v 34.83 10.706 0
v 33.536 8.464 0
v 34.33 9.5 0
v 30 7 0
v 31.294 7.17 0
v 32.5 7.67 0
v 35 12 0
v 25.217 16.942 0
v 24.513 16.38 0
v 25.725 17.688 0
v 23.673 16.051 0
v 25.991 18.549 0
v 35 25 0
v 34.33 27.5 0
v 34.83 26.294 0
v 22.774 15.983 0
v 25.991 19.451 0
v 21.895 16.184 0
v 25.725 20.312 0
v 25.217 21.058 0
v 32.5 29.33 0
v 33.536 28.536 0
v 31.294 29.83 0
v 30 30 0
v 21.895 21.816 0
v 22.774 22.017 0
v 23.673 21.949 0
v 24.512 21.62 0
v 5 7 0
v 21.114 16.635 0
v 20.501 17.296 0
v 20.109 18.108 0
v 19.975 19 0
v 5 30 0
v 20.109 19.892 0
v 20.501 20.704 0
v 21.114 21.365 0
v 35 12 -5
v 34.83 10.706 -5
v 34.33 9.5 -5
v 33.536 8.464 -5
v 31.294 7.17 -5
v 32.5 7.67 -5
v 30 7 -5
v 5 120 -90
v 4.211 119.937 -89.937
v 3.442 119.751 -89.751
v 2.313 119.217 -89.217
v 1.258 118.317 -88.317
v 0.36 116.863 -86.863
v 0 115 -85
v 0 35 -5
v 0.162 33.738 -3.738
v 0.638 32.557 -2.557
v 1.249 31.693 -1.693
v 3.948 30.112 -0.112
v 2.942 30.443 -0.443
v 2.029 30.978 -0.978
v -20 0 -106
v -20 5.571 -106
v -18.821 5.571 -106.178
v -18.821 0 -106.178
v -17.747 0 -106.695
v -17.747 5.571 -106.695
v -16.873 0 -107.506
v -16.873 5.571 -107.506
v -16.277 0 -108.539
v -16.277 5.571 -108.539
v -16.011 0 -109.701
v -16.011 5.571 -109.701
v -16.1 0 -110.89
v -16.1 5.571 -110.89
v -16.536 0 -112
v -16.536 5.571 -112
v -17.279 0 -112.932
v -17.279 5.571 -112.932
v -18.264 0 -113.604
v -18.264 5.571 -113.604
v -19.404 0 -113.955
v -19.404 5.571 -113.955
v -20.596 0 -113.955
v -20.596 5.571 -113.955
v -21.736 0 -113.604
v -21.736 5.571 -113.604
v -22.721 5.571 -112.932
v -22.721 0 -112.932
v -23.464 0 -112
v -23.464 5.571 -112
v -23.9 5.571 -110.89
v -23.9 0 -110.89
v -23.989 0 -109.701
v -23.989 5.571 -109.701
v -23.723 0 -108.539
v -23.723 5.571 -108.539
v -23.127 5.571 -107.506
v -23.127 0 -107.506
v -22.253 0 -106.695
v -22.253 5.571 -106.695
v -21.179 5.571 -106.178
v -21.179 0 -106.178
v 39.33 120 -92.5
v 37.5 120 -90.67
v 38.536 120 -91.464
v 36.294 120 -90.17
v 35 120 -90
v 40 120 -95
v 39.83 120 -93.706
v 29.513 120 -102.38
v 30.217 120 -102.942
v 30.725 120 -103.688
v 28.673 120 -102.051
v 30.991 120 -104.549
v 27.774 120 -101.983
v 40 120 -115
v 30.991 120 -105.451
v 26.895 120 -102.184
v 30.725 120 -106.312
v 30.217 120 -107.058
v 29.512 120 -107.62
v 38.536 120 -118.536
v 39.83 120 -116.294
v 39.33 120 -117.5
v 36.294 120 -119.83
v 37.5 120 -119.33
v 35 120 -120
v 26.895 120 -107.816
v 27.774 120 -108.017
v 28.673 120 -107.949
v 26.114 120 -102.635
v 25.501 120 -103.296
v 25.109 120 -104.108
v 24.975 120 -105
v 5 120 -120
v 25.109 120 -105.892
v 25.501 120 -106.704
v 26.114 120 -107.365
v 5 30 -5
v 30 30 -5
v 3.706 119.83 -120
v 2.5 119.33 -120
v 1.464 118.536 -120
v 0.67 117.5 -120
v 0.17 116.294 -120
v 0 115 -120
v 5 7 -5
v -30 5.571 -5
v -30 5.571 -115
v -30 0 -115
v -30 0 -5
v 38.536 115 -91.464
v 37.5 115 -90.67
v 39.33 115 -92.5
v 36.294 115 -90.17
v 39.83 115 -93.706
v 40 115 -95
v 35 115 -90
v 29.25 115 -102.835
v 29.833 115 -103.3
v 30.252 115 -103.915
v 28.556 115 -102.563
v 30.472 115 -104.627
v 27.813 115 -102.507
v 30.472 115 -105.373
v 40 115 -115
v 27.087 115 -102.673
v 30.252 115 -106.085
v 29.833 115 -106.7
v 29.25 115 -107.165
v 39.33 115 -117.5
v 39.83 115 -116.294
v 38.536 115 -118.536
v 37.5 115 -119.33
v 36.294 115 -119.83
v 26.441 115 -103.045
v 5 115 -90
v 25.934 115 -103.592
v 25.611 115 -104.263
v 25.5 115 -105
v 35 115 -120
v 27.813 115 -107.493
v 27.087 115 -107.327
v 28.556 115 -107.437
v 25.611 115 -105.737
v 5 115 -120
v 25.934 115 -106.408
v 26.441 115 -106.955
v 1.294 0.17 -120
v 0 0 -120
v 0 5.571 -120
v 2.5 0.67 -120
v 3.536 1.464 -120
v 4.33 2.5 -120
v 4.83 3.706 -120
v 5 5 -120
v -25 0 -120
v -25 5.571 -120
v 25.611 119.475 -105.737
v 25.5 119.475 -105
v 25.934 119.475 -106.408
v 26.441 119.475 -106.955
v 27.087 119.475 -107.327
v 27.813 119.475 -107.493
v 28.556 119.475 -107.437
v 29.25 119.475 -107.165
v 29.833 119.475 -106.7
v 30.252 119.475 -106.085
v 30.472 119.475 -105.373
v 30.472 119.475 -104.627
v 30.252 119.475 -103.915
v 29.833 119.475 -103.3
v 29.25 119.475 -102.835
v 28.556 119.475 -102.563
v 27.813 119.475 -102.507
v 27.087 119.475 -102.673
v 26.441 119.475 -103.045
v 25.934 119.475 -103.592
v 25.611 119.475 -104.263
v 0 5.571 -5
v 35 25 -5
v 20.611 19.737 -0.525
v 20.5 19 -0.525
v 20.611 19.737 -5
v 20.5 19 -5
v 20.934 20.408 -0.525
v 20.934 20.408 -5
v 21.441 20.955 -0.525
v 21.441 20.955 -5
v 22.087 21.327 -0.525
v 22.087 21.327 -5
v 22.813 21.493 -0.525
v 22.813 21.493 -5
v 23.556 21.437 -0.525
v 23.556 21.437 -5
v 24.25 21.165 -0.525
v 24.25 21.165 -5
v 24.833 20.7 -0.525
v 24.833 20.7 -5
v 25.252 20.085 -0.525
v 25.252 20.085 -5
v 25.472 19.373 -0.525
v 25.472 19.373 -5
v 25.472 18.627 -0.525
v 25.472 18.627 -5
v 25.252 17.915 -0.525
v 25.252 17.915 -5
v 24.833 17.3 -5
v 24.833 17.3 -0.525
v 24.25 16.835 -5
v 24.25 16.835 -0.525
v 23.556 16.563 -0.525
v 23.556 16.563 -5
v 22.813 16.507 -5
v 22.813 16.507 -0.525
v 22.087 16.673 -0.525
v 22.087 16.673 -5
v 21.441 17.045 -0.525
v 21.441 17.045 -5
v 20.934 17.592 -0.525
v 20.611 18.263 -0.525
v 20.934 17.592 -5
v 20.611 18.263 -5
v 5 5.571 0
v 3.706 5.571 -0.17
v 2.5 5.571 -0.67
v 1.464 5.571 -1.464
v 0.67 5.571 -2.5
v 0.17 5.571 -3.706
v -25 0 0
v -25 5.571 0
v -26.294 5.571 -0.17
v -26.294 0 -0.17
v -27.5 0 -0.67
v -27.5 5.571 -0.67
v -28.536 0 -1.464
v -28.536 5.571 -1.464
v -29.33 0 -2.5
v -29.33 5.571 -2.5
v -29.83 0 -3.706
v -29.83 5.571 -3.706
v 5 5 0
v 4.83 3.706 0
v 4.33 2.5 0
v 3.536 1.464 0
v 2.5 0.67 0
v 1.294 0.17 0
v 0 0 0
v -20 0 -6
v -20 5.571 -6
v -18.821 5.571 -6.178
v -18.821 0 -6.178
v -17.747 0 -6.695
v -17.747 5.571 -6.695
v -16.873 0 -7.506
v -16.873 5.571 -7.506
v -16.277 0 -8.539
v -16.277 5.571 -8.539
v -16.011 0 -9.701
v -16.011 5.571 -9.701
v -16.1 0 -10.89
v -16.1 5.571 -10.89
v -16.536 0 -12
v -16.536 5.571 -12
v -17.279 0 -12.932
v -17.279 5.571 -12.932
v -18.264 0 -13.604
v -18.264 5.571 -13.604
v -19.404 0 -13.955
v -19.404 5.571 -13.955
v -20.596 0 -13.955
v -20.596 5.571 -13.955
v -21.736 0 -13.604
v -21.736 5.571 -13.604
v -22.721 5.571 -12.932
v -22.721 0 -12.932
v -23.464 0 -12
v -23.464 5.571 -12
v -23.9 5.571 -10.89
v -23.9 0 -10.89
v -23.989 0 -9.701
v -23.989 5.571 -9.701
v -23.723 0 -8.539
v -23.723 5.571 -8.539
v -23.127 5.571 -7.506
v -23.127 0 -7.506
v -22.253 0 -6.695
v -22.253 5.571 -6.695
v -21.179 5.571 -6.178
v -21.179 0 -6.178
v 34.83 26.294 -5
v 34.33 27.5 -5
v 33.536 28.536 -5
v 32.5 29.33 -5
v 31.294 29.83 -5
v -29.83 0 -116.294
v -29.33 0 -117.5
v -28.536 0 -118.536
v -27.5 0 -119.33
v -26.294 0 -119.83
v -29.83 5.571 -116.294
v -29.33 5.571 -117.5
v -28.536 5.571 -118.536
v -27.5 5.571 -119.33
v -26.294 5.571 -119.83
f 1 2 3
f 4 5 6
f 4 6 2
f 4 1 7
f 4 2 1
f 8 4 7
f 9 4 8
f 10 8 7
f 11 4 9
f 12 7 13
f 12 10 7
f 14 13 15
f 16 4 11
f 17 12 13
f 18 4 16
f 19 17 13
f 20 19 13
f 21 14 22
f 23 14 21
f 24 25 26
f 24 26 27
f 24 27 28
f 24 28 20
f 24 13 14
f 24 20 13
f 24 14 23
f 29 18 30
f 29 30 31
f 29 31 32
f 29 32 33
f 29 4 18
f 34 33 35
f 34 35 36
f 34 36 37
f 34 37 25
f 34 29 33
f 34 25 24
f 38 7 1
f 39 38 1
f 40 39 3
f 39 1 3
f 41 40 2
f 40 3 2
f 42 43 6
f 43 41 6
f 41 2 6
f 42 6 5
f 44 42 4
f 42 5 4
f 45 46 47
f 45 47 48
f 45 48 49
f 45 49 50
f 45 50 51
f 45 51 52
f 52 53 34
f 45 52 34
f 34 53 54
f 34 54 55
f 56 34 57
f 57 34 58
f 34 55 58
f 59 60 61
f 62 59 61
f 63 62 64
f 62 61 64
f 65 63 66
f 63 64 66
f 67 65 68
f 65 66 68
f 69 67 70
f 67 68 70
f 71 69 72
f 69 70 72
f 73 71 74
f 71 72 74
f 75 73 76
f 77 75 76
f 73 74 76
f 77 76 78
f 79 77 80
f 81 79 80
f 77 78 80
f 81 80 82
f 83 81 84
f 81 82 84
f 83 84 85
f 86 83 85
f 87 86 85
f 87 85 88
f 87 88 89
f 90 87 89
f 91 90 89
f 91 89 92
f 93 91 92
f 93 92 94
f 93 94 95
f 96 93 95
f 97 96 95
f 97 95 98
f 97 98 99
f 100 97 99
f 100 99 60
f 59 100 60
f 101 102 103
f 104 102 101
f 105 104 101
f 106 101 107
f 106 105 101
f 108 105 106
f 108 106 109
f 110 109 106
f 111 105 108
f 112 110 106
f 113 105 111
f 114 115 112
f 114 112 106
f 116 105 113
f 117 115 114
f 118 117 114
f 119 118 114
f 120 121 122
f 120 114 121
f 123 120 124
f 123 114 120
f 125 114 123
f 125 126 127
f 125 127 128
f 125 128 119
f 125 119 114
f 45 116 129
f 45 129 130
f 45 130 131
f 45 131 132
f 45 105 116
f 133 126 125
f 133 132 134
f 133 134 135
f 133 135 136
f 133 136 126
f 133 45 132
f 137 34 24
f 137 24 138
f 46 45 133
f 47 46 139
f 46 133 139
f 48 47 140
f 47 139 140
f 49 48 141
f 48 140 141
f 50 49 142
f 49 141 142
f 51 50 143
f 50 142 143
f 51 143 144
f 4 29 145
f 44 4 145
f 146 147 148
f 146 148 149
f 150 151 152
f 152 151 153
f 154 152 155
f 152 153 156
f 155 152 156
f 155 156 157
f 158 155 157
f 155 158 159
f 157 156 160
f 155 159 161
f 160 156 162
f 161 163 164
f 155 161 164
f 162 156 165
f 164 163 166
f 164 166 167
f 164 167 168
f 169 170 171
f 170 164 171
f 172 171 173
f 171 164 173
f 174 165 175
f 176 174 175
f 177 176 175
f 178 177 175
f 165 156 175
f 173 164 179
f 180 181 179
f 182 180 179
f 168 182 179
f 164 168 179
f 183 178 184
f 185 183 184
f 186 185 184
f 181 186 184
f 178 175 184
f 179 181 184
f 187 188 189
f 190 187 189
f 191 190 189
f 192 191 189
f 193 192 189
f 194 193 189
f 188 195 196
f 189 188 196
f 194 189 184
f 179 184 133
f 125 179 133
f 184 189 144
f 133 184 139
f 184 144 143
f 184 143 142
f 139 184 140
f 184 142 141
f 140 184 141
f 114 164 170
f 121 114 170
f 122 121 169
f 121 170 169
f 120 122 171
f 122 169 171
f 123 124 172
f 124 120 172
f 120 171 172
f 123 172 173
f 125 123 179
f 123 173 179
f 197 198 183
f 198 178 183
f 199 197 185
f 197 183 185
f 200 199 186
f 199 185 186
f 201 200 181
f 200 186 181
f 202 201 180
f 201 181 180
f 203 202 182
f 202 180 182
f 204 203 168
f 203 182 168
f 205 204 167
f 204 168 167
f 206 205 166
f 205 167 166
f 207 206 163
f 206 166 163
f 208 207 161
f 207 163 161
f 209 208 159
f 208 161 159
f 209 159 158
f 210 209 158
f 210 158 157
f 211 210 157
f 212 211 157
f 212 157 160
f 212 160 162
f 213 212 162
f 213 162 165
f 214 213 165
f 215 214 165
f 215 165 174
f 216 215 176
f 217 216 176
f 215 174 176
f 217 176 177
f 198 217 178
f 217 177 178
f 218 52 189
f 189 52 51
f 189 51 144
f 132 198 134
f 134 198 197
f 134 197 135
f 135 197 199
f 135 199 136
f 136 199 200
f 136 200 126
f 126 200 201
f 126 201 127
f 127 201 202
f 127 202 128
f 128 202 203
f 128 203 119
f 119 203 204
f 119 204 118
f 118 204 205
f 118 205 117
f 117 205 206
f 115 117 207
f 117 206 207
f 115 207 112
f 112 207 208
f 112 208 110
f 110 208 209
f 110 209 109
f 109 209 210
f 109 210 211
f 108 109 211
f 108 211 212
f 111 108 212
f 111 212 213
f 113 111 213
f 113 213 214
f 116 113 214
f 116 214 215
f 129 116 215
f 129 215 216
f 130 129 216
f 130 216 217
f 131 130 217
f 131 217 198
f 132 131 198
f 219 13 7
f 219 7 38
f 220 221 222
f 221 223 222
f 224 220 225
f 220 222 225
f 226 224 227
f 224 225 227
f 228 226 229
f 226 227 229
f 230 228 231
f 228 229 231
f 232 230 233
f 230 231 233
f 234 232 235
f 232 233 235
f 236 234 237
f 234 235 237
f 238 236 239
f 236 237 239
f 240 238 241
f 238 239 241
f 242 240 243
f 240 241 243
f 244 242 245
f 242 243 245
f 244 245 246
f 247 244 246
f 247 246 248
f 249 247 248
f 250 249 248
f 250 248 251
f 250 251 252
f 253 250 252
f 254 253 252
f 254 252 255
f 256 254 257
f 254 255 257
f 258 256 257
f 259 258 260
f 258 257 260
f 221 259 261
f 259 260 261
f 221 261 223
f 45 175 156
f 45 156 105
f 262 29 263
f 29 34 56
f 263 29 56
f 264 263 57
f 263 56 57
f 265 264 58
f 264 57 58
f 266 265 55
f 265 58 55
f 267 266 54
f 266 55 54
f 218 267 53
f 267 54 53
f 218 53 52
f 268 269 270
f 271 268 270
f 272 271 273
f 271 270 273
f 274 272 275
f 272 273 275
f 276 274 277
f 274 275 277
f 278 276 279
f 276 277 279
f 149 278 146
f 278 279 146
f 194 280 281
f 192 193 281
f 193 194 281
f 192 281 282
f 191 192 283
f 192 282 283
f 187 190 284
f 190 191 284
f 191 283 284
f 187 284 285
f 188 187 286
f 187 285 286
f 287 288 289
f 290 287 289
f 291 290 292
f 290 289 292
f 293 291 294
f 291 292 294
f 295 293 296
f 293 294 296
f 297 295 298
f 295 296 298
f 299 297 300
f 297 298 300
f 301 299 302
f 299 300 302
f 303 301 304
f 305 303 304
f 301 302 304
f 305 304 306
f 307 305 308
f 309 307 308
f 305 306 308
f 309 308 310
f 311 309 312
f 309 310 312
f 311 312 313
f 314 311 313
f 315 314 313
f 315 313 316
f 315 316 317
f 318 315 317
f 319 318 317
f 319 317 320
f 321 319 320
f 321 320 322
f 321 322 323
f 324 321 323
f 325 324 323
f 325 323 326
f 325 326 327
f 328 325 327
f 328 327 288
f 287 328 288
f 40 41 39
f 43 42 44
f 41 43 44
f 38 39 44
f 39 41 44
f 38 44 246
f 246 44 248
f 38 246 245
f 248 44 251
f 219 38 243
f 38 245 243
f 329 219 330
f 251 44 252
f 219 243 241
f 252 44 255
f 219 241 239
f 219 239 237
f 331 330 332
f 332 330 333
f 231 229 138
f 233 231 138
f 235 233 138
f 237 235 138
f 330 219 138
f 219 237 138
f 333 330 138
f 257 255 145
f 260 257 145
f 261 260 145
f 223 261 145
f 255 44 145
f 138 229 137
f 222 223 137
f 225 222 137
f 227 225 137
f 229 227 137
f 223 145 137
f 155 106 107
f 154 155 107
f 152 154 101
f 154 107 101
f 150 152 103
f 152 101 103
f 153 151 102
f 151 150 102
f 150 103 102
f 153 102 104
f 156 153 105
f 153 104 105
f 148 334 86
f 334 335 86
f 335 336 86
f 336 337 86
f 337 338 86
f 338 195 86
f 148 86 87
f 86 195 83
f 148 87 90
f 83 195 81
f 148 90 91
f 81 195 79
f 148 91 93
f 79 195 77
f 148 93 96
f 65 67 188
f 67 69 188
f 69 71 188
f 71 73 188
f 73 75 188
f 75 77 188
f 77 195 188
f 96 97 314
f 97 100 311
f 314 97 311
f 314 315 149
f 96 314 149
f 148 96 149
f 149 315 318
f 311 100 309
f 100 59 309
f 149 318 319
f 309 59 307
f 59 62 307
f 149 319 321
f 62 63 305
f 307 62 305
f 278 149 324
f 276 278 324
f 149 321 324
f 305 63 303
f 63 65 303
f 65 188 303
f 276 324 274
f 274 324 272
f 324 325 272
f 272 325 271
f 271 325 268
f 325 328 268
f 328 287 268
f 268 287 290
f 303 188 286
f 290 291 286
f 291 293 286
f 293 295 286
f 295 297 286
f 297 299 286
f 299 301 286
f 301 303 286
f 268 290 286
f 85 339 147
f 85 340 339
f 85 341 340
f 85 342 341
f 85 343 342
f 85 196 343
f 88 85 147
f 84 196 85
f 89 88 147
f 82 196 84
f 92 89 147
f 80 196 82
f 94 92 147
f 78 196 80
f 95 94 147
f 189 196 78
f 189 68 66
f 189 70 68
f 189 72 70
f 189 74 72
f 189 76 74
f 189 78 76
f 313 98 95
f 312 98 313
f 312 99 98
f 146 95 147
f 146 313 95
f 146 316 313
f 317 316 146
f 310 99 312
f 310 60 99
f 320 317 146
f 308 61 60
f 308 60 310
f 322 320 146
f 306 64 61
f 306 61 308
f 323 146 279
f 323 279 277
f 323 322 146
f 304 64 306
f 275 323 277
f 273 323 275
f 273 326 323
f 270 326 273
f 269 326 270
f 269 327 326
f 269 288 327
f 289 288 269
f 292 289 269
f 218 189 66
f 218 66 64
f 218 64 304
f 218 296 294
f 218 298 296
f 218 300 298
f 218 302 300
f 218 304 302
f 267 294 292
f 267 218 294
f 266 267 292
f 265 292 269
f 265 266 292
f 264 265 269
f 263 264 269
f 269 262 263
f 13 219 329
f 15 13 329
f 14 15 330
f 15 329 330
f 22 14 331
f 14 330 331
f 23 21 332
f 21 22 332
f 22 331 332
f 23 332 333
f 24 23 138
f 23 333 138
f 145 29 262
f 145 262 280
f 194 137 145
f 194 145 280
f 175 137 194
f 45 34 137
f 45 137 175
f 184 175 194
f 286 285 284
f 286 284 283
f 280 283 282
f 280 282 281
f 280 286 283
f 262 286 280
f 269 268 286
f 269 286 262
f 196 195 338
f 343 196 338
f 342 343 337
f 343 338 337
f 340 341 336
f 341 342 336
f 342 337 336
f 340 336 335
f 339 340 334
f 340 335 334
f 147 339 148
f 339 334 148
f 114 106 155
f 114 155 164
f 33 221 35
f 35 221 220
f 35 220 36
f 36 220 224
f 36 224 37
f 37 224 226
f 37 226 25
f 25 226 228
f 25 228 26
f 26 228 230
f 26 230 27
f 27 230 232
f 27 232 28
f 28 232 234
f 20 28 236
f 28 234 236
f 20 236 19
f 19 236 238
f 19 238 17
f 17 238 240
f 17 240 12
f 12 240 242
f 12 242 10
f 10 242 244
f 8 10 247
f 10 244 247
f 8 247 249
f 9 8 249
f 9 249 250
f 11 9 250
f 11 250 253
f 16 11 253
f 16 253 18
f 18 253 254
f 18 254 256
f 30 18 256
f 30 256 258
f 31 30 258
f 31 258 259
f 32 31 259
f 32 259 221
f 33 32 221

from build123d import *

# Parameters (mm, degrees)
ESTRUSIONE_ESTRUSIONE1_DEPTH    = 5
SCHIZZO2_W                      = 120
SCHIZZO2_H                      = 5.571316046
ESTRUSIONE_ESTRUSIONE2_DEPTH    = 30
SCHIZZO3_W                      = 5
SCHIZZO3_H                      = 23
ESTRUSIONE_ESTRUSIONE3_DEPTH    = 30
SCHIZZO4_W                      = 30
SCHIZZO4_H                      = 5
ESTRUSIONE_ESTRUSIONE4_DEPTH    = 35
RACCORDO1_R                     = 5
FORO_FILETTATO_M6_2_D           = 5
FORO_FILETTATO_M6_2_CSINK_D     = 6.05
FORO_FILETTATO_M6_2_CSINK_ANGLE = 90
FORO_FILETTATO_M6_3_D           = 5
FORO_FILETTATO_M6_3_CSINK_D     = 6.05
FORO_FILETTATO_M6_3_CSINK_ANGLE = 90
SCHIZZO13_R                     = 4
TAGLIO_ESTRUSIONE1_DEPTH        = 171.569410245


with BuildPart() as part:
    # Schizzo1 → Estrusione-Estrusione1 (new body)
    with BuildSketch(Plane(origin=(0, 0, 0), x_dir=(0, 0, -1), z_dir=(1, 0, 0))):
        Polygon((0, 0), (120, 0), (120, 120), (90, 120), (0, 30), align=None)
    extrude(amount=ESTRUSIONE_ESTRUSIONE1_DEPTH)

    # Schizzo2 → Estrusione-Estrusione2 (add)
    with BuildSketch(Plane.ZY):
        with Locations((-60, 2.785658023)):
            Rectangle(SCHIZZO2_W, SCHIZZO2_H)
    extrude(amount=ESTRUSIONE_ESTRUSIONE2_DEPTH)

    # Schizzo3 → Estrusione-Estrusione3 (add)
    with BuildSketch(Plane(origin=(5, 0, 0), x_dir=(0, 0, -1), z_dir=(1, 0, 0))):
        with Locations((2.5, 18.5)):
            Rectangle(SCHIZZO3_W, SCHIZZO3_H)
    extrude(amount=ESTRUSIONE_ESTRUSIONE3_DEPTH)

    # Schizzo4 → Estrusione-Estrusione4 (add)
    with BuildSketch(Plane(origin=(5, 0, 0), x_dir=(0, 0, -1), z_dir=(1, 0, 0))):
        with Locations((105, 117.5)):
            Rectangle(SCHIZZO4_W, SCHIZZO4_H)
    extrude(amount=ESTRUSIONE_ESTRUSIONE4_DEPTH)

    # Raccordo1
    # the kernel refuses this fillet: 5 mm, written as the material it takes off along each edge
    with BuildSketch(Plane(origin=(40, 102.5, -120), x_dir=(0, 0, 1), z_dir=(0, 1, 0)), Plane(origin=(35, 7, 12.5), x_dir=(0, 1, 0), z_dir=(0, 0, -1))) as raccordo1_piece_1:
        with BuildLine():
            CenterArc((RACCORDO1_R, -RACCORDO1_R), RACCORDO1_R, 90, 90)
            Line((0, -RACCORDO1_R), (0, 0))
            Line((0, 0), (RACCORDO1_R, 0))
        make_face()
    extrude(amount=30, mode=Mode.SUBTRACT)
    with BuildSketch(Plane(origin=(40, 132.5, -90), x_dir=(-1, 0, 0), z_dir=(0, -1, 0)), Plane(origin=(35, 30, -17.5), x_dir=(-1, 0, 0), z_dir=(0, 0, 1))) as raccordo1_piece_2:
        with BuildLine():
            CenterArc((RACCORDO1_R, RACCORDO1_R), RACCORDO1_R, 180, 90)
            Line((0, RACCORDO1_R), (0, 0))
            Line((0, 0), (RACCORDO1_R, 0))
        make_face()
    extrude(amount=30, mode=Mode.SUBTRACT)
    with BuildSketch(Plane(origin=(-30, 18.071316046, 0), x_dir=(0, 0, -1), z_dir=(0, -1, 0)), Plane(origin=(-30, -12.5, -120), x_dir=(0, 0, 1), z_dir=(0, 1, 0))) as raccordo1_piece_3:
        with BuildLine():
            CenterArc((RACCORDO1_R, RACCORDO1_R), RACCORDO1_R, 180, 90)
            Line((0, RACCORDO1_R), (0, 0))
            Line((0, 0), (RACCORDO1_R, 0))
        make_face()
    extrude(amount=30.571316046, mode=Mode.SUBTRACT)
    with BuildSketch(Plane(origin=(5, 0, 12.5), x_dir=(-1, 0, 0), z_dir=(0, 0, -1))) as raccordo1_piece_4:
        with BuildLine():
            CenterArc((RACCORDO1_R, RACCORDO1_R), RACCORDO1_R, 180, 90)
            Line((0, RACCORDO1_R), (0, 0))
            Line((0, 0), (RACCORDO1_R, 0))
        make_face()
    extrude(amount=145, mode=Mode.SUBTRACT)
    with BuildSketch(Plane(origin=(0, 120, -132.5), x_dir=(0, -1, 0), z_dir=(0, 0, 1))) as raccordo1_piece_5:
        with BuildLine():
            CenterArc((RACCORDO1_R, RACCORDO1_R), RACCORDO1_R, 180, 90)
            Line((0, RACCORDO1_R), (0, 0))
            Line((0, 0), (RACCORDO1_R, 0))
        make_face()
    extrude(amount=55, mode=Mode.SUBTRACT)
    with BuildSketch(Plane(origin=(0, 42.5, 0), x_dir=(0, 0, -1), z_dir=(0, -1, 0))) as raccordo1_piece_6:
        with BuildLine():
            CenterArc((RACCORDO1_R, RACCORDO1_R), RACCORDO1_R, 180, 90)
            Line((0, RACCORDO1_R), (0, 0))
            Line((0, 0), (RACCORDO1_R, 0))
        make_face()
    extrude(amount=36.928683954, mode=Mode.SUBTRACT)

    # Foro filettato M6-2 (through all)
    with Locations(Plane(origin=(0, 120, 0), x_dir=(1, 0, 0), z_dir=(0, 1, 0))):
        with Locations((28, 105)):
            CounterSinkHole(FORO_FILETTATO_M6_2_D / 2, FORO_FILETTATO_M6_2_CSINK_D / 2, counter_sink_angle=FORO_FILETTATO_M6_2_CSINK_ANGLE)

    # Foro filettato M6-3 (through all)
    with Locations(Plane.XY):
        with Locations((23, 19)):
            CounterSinkHole(FORO_FILETTATO_M6_3_D / 2, FORO_FILETTATO_M6_3_CSINK_D / 2, counter_sink_angle=FORO_FILETTATO_M6_3_CSINK_ANGLE)

    # Schizzo13 → Taglio-Estrusione1 (cut, through all)
    with BuildSketch(Plane(origin=(0, 5.571316046, 0), x_dir=(1, 0, 0), z_dir=(0, 1, 0))):
        with Locations(Location((-20, 110, 0), (0, 0, 270))):
            Circle(SCHIZZO13_R)
        with Locations(Location((-20, 10, 0), (0, 0, 270))):
            Circle(SCHIZZO13_R)
    extrude(amount=-TAGLIO_ESTRUSIONE1_DEPTH, mode=Mode.SUBTRACT)


solid = part.part
